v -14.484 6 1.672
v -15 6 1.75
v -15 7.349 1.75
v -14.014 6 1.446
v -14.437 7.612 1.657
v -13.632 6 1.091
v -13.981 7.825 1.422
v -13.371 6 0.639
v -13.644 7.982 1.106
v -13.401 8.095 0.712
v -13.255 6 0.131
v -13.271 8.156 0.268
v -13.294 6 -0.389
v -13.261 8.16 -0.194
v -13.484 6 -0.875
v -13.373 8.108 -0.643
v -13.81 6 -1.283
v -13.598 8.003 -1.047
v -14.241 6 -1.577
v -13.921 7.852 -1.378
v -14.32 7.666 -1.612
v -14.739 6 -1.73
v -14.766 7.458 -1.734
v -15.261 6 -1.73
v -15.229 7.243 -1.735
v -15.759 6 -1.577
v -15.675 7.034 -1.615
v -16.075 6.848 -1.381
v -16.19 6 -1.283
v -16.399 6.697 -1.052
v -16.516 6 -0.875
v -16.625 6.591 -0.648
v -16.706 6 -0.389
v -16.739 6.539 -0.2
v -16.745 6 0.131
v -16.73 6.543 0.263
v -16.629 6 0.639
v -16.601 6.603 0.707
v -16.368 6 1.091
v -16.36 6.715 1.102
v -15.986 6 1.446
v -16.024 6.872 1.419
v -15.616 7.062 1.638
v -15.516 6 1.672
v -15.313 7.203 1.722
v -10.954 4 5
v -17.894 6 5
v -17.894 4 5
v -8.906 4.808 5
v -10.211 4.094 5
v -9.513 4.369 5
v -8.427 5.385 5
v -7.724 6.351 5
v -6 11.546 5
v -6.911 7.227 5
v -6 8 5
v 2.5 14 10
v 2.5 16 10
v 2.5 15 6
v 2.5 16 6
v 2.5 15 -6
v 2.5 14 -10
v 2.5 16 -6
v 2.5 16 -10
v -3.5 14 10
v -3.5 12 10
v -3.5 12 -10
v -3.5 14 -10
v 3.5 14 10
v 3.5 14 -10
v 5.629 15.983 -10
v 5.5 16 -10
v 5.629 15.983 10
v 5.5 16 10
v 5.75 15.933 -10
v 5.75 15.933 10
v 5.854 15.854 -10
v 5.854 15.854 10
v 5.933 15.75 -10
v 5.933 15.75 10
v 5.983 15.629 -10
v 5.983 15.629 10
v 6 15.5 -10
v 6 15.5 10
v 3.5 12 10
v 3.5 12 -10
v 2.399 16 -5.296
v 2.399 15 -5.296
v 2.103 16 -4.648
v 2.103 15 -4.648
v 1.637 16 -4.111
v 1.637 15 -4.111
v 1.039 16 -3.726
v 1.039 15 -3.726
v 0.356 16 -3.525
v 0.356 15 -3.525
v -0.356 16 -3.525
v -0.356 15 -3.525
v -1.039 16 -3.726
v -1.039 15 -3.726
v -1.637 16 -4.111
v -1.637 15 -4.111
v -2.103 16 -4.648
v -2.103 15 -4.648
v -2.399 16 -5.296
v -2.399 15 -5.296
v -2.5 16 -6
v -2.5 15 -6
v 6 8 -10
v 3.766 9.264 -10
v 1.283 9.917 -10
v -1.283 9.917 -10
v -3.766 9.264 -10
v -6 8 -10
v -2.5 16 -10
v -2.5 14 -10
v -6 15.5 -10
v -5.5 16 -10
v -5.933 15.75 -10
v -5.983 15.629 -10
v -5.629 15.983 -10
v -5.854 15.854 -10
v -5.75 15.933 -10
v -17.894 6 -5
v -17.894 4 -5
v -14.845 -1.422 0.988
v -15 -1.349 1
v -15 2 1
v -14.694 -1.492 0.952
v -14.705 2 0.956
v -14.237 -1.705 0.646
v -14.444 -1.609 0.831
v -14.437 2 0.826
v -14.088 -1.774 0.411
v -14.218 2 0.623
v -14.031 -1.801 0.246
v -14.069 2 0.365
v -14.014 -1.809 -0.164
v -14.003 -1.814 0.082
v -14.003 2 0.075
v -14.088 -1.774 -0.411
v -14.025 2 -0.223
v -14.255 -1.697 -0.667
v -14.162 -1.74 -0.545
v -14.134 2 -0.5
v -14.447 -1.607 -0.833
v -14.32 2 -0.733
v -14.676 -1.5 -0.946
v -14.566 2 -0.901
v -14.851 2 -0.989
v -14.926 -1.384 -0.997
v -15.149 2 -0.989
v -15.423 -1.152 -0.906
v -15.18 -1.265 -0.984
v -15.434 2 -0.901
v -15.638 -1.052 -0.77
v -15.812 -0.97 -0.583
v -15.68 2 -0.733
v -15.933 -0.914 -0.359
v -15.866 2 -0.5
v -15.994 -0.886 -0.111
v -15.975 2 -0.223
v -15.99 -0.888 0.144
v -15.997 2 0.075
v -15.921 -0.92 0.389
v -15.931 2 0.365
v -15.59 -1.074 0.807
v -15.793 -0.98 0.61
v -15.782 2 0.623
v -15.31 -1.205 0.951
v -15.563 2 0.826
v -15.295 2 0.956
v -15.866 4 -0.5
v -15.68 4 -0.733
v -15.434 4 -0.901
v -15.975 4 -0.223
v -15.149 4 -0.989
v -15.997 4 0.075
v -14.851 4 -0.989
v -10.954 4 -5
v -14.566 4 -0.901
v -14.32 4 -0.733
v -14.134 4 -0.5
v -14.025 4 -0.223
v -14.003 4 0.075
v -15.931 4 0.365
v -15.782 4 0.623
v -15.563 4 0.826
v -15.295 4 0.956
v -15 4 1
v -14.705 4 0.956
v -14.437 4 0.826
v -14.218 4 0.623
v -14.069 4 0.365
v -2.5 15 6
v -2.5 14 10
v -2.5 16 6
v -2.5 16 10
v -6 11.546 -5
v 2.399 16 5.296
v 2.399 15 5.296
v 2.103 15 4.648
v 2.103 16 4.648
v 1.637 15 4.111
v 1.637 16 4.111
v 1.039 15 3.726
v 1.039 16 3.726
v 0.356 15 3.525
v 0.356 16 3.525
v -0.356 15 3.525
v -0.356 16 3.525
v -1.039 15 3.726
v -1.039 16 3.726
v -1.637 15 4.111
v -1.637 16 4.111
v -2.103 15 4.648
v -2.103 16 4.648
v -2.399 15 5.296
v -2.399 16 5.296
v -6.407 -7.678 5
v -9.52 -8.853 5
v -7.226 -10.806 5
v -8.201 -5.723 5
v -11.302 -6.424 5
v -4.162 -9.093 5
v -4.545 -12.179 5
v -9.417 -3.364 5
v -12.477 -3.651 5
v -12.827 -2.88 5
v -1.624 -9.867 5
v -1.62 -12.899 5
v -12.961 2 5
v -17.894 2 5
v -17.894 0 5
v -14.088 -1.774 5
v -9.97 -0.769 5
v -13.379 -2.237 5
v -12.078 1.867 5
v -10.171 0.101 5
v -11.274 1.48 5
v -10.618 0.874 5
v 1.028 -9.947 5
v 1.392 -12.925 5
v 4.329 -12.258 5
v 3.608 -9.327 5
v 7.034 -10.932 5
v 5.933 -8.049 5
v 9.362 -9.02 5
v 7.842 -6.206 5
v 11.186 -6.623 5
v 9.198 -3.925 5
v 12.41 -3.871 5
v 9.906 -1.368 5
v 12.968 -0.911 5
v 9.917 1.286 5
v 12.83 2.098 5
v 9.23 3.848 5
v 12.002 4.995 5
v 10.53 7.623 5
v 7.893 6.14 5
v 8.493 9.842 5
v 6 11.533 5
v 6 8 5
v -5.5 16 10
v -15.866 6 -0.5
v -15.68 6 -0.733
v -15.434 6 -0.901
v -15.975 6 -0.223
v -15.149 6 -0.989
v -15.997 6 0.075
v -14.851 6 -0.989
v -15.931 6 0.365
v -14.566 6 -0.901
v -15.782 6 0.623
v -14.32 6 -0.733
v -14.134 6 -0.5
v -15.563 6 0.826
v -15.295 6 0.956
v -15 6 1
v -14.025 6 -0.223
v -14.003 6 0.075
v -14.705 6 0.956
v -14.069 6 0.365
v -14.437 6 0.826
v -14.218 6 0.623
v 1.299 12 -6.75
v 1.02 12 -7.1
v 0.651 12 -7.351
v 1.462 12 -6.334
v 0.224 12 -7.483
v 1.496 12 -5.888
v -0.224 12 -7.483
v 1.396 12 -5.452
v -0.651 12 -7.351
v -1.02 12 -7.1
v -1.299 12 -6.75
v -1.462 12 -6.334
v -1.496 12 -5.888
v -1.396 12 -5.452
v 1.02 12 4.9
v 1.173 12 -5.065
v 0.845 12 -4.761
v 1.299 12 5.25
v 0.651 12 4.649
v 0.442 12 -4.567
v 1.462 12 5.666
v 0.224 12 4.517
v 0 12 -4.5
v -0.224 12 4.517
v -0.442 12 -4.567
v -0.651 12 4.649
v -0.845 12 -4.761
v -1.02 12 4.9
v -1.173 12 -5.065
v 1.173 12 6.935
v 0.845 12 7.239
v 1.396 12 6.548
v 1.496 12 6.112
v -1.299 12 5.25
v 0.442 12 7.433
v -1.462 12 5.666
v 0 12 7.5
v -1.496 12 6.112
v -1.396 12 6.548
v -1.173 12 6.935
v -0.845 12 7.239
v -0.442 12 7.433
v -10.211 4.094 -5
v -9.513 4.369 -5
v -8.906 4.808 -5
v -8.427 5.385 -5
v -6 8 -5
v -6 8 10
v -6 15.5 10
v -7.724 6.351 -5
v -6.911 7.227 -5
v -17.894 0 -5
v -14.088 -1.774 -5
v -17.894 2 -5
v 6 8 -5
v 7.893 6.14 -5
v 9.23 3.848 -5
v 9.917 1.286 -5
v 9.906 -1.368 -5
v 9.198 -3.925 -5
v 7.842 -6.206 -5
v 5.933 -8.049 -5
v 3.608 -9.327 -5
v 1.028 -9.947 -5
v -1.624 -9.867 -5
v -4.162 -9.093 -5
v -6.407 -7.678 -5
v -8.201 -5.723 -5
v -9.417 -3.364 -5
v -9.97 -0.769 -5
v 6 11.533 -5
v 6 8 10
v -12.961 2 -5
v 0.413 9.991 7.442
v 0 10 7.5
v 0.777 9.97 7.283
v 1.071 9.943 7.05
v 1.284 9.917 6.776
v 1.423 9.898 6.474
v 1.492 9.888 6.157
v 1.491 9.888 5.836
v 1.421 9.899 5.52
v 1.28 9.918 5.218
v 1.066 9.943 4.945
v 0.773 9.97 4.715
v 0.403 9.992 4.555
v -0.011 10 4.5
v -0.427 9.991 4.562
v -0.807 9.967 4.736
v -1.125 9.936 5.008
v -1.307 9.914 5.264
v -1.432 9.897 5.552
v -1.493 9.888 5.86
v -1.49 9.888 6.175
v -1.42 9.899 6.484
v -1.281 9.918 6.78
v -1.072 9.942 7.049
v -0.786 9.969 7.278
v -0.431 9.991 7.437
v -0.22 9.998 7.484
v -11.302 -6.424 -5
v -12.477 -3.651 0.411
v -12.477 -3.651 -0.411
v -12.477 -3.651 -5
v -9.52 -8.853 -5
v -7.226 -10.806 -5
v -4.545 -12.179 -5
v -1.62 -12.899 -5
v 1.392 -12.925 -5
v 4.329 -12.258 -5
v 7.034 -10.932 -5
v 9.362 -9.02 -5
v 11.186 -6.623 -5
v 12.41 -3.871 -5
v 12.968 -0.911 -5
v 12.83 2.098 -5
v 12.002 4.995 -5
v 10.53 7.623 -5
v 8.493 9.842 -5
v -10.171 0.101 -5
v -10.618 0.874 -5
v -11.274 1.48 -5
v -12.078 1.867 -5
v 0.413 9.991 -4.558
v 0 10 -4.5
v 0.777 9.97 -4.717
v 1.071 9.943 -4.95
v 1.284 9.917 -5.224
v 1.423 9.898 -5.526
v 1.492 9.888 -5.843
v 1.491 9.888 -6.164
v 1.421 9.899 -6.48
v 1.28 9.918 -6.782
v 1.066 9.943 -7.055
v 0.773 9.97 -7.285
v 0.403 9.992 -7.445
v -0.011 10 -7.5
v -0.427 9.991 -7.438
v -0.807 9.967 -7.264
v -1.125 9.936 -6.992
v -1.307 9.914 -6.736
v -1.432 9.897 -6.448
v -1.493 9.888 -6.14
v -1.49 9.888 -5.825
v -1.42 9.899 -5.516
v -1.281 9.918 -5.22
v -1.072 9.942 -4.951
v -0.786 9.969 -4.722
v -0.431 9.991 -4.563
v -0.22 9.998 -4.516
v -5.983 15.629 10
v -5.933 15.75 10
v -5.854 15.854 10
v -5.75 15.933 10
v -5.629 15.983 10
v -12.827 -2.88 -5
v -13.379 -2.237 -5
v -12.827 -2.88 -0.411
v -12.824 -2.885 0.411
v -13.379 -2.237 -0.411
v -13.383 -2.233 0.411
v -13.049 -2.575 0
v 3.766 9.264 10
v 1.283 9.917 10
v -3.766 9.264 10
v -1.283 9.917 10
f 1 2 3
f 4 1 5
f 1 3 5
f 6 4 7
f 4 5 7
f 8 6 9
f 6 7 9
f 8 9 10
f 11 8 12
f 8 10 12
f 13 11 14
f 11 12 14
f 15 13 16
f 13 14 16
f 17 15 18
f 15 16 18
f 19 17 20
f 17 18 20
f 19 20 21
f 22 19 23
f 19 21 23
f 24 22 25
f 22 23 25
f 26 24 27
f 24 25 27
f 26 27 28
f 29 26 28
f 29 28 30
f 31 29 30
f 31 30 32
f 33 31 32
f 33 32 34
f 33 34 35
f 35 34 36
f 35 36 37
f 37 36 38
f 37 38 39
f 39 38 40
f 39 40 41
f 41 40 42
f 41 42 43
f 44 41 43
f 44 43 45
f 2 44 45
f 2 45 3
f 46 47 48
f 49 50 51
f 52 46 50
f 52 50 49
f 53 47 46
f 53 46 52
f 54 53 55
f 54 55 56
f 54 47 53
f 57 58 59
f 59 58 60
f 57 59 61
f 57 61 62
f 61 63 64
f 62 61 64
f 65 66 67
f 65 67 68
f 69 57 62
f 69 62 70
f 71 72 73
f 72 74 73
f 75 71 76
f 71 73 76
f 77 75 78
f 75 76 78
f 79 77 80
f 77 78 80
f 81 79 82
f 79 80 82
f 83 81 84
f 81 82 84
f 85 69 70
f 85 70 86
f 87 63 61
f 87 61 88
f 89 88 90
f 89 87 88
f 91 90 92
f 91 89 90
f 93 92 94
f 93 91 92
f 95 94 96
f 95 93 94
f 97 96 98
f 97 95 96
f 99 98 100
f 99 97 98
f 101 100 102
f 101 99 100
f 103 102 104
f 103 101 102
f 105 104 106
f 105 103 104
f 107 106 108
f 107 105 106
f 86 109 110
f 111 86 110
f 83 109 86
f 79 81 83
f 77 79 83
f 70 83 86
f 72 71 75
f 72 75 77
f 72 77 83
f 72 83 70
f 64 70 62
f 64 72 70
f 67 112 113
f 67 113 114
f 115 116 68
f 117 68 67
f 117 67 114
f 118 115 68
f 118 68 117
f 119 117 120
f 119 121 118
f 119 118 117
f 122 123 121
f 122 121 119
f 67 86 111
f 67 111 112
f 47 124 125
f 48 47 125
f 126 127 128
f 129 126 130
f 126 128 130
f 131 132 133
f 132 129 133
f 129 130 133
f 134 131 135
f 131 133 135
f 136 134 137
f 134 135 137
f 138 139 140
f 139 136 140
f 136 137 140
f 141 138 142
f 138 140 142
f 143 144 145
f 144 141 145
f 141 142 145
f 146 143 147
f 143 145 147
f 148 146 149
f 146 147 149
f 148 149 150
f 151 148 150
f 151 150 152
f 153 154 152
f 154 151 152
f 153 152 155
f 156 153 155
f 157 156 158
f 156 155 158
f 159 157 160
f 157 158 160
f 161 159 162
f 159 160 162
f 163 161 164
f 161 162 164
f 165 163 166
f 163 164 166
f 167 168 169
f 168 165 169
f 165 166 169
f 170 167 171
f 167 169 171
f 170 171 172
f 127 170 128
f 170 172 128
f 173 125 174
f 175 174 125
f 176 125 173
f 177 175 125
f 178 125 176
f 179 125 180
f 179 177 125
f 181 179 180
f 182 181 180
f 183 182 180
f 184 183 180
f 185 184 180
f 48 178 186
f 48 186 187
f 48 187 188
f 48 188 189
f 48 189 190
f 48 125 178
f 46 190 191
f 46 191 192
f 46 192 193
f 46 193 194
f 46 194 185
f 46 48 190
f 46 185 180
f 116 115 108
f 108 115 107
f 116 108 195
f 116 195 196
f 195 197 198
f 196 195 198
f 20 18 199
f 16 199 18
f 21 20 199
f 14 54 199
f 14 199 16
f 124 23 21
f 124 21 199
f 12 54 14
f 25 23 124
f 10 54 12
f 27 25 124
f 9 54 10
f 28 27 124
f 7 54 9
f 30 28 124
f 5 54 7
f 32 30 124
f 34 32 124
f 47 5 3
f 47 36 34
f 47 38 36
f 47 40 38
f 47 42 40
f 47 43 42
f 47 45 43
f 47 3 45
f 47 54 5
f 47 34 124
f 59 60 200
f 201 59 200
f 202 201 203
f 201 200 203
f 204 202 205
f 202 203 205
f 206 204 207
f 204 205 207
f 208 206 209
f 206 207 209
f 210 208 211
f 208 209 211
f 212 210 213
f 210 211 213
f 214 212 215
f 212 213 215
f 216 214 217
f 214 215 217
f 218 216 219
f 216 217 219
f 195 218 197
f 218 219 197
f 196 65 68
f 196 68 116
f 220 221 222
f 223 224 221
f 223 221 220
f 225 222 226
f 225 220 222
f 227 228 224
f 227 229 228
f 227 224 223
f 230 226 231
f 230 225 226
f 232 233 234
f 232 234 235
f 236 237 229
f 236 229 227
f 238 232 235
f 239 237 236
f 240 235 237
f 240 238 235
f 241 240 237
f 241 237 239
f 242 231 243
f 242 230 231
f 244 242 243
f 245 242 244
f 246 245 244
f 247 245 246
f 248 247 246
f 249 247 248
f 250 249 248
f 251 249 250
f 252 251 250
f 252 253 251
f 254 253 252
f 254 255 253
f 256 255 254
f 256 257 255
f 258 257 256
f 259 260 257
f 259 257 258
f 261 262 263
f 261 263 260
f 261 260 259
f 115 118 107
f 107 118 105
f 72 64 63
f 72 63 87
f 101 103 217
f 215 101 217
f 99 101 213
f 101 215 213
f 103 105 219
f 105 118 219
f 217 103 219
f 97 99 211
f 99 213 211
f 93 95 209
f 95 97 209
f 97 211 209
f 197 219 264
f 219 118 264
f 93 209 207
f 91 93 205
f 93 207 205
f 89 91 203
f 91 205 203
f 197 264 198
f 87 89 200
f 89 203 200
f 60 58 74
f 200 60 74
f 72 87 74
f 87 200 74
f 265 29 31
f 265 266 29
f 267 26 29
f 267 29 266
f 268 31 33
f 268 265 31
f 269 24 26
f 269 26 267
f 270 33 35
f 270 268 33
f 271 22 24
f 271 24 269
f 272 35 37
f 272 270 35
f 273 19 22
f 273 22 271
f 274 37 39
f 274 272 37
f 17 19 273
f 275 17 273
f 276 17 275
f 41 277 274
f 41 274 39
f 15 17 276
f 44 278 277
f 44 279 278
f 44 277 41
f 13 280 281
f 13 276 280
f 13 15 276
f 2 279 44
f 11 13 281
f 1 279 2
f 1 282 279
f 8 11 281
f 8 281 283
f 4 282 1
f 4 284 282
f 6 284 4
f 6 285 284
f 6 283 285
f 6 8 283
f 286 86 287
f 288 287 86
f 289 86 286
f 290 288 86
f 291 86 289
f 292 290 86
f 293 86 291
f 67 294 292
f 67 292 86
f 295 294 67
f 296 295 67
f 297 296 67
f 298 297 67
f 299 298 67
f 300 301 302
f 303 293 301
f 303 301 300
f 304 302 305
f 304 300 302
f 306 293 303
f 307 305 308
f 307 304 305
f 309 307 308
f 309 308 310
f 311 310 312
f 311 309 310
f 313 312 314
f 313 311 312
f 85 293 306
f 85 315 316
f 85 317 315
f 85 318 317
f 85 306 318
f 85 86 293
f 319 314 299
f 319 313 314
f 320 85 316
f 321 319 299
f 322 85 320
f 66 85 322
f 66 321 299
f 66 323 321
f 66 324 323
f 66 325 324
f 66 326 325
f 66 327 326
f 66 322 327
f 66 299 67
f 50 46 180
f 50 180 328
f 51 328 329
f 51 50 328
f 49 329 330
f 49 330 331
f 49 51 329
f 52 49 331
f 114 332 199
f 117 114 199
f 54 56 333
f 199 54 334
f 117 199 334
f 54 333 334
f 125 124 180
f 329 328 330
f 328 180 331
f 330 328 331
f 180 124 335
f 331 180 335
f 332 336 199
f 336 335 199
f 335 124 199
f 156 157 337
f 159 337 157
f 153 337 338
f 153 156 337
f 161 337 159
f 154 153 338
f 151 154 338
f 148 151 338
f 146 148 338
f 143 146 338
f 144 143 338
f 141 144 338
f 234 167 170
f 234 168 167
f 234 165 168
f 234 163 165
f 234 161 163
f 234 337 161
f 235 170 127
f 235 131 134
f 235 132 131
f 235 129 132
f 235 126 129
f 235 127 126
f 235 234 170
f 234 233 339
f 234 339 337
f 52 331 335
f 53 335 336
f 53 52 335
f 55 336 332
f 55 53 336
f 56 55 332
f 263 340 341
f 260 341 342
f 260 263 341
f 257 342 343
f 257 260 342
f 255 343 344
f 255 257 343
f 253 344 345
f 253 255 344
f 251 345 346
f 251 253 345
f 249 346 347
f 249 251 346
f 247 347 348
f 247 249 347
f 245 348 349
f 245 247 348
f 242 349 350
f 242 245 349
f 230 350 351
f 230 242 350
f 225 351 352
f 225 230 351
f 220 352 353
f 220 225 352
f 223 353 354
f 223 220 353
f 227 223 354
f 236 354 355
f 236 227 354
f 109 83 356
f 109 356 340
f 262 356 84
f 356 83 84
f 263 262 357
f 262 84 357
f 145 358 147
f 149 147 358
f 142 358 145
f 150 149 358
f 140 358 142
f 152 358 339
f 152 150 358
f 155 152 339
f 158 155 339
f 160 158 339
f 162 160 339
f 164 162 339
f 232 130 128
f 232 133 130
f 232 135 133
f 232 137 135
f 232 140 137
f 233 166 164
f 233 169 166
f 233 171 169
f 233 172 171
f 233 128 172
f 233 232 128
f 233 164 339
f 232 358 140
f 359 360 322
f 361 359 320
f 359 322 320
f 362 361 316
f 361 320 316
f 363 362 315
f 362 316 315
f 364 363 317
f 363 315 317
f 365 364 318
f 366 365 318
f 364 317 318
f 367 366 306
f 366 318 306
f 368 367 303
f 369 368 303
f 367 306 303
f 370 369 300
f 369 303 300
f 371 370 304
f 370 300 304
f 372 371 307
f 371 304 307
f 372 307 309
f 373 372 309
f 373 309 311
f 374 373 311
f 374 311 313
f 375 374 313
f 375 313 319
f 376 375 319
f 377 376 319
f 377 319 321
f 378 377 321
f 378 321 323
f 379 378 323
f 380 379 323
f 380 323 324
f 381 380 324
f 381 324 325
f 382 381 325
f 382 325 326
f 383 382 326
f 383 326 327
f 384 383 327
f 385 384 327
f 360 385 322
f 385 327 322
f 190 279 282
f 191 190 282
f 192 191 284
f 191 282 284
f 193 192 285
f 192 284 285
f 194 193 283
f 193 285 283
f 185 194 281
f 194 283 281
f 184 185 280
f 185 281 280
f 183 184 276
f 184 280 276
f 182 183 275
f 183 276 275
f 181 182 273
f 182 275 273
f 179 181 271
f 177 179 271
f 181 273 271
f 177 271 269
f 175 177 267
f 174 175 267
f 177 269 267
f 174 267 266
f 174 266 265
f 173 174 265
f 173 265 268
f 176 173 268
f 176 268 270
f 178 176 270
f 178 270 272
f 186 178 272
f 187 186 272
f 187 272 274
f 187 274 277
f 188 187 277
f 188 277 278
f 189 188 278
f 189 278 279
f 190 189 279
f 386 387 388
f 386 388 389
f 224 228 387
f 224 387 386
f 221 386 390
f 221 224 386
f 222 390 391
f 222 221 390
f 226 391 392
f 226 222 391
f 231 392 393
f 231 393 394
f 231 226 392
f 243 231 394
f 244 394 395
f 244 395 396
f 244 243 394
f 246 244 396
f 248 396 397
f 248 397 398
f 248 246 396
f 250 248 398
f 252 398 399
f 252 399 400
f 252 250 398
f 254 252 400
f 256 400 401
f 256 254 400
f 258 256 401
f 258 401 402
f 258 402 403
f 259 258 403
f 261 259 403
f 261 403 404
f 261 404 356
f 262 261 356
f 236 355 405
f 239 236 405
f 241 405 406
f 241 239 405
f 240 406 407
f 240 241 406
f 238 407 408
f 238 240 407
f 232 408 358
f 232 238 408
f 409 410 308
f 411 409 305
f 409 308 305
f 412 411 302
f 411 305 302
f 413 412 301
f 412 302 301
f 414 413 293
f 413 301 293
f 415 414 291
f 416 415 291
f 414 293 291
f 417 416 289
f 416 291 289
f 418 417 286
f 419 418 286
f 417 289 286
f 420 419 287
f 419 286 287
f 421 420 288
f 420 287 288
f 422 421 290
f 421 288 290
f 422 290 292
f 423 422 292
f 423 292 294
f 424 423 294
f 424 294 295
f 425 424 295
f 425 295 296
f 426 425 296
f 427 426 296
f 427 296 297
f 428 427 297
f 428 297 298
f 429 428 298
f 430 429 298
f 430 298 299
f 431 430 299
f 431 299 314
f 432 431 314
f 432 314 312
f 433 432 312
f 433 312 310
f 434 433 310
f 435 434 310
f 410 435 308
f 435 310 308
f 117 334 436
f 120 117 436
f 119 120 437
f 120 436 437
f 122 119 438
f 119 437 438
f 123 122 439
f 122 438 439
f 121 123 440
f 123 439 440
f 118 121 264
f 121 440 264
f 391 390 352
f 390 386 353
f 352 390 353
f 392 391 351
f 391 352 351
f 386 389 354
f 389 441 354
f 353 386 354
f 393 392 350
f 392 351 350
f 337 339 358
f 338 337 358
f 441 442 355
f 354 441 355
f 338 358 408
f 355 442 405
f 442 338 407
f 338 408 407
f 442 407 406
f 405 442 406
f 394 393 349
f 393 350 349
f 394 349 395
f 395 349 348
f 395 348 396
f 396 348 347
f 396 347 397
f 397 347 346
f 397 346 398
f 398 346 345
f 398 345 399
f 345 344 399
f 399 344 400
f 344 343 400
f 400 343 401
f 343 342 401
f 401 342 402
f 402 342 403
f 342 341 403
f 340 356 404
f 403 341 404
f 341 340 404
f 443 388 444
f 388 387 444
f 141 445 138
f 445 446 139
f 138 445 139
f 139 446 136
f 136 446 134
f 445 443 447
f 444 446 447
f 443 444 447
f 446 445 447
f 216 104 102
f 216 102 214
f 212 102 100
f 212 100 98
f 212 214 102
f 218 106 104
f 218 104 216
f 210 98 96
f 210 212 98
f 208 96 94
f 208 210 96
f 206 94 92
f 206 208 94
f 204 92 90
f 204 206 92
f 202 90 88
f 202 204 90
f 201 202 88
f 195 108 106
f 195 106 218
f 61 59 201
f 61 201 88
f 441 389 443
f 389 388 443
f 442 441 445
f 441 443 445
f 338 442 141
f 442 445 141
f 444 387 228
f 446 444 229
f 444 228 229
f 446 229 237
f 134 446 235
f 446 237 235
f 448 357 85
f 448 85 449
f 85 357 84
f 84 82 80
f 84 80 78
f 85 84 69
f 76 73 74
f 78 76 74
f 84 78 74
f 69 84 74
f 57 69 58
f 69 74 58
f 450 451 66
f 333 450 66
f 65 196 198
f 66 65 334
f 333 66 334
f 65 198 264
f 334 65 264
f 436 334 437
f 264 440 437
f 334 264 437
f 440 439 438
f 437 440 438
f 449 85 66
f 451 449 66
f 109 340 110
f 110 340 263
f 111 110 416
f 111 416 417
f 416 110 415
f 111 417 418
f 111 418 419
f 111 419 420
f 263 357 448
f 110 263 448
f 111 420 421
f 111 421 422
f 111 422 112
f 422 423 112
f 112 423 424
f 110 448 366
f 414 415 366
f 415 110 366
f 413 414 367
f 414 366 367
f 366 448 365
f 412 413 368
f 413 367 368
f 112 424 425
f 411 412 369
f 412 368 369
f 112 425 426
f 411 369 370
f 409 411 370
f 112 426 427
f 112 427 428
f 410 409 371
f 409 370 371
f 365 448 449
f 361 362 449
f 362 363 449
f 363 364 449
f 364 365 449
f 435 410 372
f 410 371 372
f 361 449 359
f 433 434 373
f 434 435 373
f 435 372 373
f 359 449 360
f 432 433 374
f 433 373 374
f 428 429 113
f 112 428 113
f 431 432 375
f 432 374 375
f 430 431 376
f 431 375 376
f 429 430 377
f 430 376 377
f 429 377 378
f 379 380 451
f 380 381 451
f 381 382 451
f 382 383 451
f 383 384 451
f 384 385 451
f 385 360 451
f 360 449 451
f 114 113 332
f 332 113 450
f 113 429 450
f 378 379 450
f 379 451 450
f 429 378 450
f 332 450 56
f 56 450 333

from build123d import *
from build123d.topology import SkipClean

# Parameters (mm, degrees)
BOSS_EXTRUDE1_DEPTH     = 5
CUT_EXTRUDE1_DEPTH      = 11
BOSS_EXTRUDE2_DEPTH     = 10
CUT_EXTRUDE2_DEPTH      = 21
CUT_EXTRUDE3_REACH      = 31
CUT_EXTRUDE4_REACH      = 27
CUT_EXTRUDE4_END_RADIUS = 10
SKETCH6_R               = 1.5
SKETCH9_R               = 1.75
CUT_EXTRUDE7_DEPTH      = 10
SKETCH10_R              = 1
CUT_EXTRUDE6_DEPTH      = 30
FILLET9_R               = 3


with BuildPart() as part:
    # Sketch1 → Boss-Extrude1 (new body, symmetric)
    with BuildSketch(Plane.XY):
        with BuildLine():
            Line((-17.893579058, 0), (-12.779389539, -2.384785738))
            ThreePointArc((-12.779389539, -2.384785738), (11.560882159, -5.945250516), (-5.494037403, 11.782001231))
            Line((-5.494037403, 11.782001231), (-17.893579058, 6))
            Line((-17.893579058, 6), (-17.893579058, 0))
        make_face()
    extrude(amount=BOSS_EXTRUDE1_DEPTH, both=True)

    # Sketch2 → Cut-Extrude1 (cut, through all)
    with BuildSketch(Plane.XY.offset(5)):
        with BuildLine():
            Line((-17.893579058, 4), (-10.95445115, 4))
            ThreePointArc((-10.95445115, 4), (-9.513297766, 4.368825942), (-8.426500885, 5.384615385))
            ThreePointArc((-8.426500885, 5.384615385), (9.699416117, -2.43337769), (-9.970370305, -0.769230769))
            ThreePointArc((-9.970370305, -0.769230769), (-10.923382735, 1.201398157), (-12.961481397, 2))
            Line((-12.961481397, 2), (-17.893579058, 2))
            Line((-17.893579058, 2), (-17.893579058, 4))
        make_face()
    extrude(amount=-CUT_EXTRUDE1_DEPTH, mode=Mode.SUBTRACT)

    # Sketch3 → Boss-Extrude2 (add, symmetric)
    with SkipClean():  # keep this step's faces unmerged: merging them makes the solid invalid here
        with BuildSketch(Plane.XY):
            with BuildLine():
                Line((-5.5, 16), (5.5, 16))
                ThreePointArc((5.5, 16), (5.853553391, 15.853553391), (6, 15.5))
                Line((6, 15.5), (6, 8))
                ThreePointArc((6, 8), (0, 10), (-6, 8))
                Line((-6, 8), (-6, 15.5))
                ThreePointArc((-6, 15.5), (-5.853553391, 15.853553391), (-5.5, 16))
            make_face()
        extrude(amount=BOSS_EXTRUDE2_DEPTH, both=True)

    # Sketch4 → Cut-Extrude2 (cut, through all)
    with SkipClean():  # keep this step's faces unmerged: merging them makes the solid invalid here
        with BuildSketch(Plane.XY.offset(10)):
            Polygon((-2.5, 15), (2.5, 15), (2.5, 14), (3.5, 14), (3.5, 12), (-3.5, 12), (-3.5, 14), (-2.5, 14), align=None)
        extrude(amount=-CUT_EXTRUDE2_DEPTH, mode=Mode.SUBTRACT)

    # Sketch5 → Cut-Extrude3 (cut, up to next)
    with BuildSketch(Plane(origin=(0, 16, 0), x_dir=(1, 0, 0), z_dir=(0, 1, 0)), mode=Mode.PRIVATE) as cut_extrude3_sk1:
        with BuildLine():
            Line((-2.5, 6), (-2.5, 10))
            Line((-2.5, 10), (2.5, 10))
            Line((2.5, 10), (2.5, 6))
            ThreePointArc((2.5, 6), (0, 3.5), (-2.5, 6))
        make_face()
    cut_extrude3_tool1 = extrude(cut_extrude3_sk1.sketch, amount=-CUT_EXTRUDE3_REACH, mode=Mode.PRIVATE) & part.part
    add(cut_extrude3_tool1.solids().sort_by_distance((0, 16, -6.992147))[0], mode=Mode.SUBTRACT)
    # Sketch5 → Cut-Extrude3 (cut, up to next)
    with BuildSketch(Plane(origin=(0, 16, 0), x_dir=(1, 0, 0), z_dir=(0, 1, 0)), mode=Mode.PRIVATE) as cut_extrude3_sk2:
        with BuildLine():
            Line((2.5, -10), (2.5, -6))
            ThreePointArc((2.5, -6), (0, -3.5), (-2.5, -6))
            Line((-2.5, -6), (-2.5, -10))
            Line((-2.5, -10), (2.5, -10))
        make_face()
    cut_extrude3_tool2 = extrude(cut_extrude3_sk2.sketch, amount=-CUT_EXTRUDE3_REACH, mode=Mode.PRIVATE) & part.part
    add(cut_extrude3_tool2.solids().sort_by_distance((0, 16, 6.992147))[0], mode=Mode.SUBTRACT)

    # Cut-Extrude4: up to this cylinder (the profile starts outside it)
    cut_extrude4_end = Plane(origin=(0, 0, 0), z_dir=(0, 0, 1)) * Cylinder(CUT_EXTRUDE4_END_RADIUS, 87, mode=Mode.PRIVATE)
    # Sketch6 → Cut-Extrude4 (cut, up to the surface)
    with BuildSketch(Plane(origin=(0, 12, 0), x_dir=(1, 0, 0), z_dir=(0, 1, 0)), mode=Mode.PRIVATE) as cut_extrude4_sk1:
        with Locations(Location((0, 6, 0), (0, 0, 270))):  # turned: the seam where the file's is
            Circle(SKETCH6_R)
    cut_extrude4_tool1 = extrude(cut_extrude4_sk1.sketch, amount=-CUT_EXTRUDE4_REACH, mode=Mode.PRIVATE) - cut_extrude4_end
    add(cut_extrude4_tool1.solids().sort_by_distance((0, 12, -6))[0], mode=Mode.SUBTRACT)
    # Sketch6 → Cut-Extrude4 (cut, up to the surface)
    with BuildSketch(Plane(origin=(0, 12, 0), x_dir=(1, 0, 0), z_dir=(0, 1, 0)), mode=Mode.PRIVATE) as cut_extrude4_sk2:
        with Locations(Location((0, -6, 0), (0, 0, 270))):  # turned: the seam where the file's is
            Circle(SKETCH6_R)
    cut_extrude4_tool2 = extrude(cut_extrude4_sk2.sketch, amount=-CUT_EXTRUDE4_REACH, mode=Mode.PRIVATE) - cut_extrude4_end
    add(cut_extrude4_tool2.solids().sort_by_distance((0, 12, 6))[0], mode=Mode.SUBTRACT)

    # Sketch9 → Cut-Extrude7 (cut)
    with BuildSketch(Plane(origin=(0, 16, 0), x_dir=(1, 0, 0), z_dir=(0, 1, 0))):
        with Locations(Location((-15, 0, 0), (0, 0, 270))):  # turned: the seam where the file's is
            Circle(SKETCH9_R)
    extrude(amount=-CUT_EXTRUDE7_DEPTH, mode=Mode.SUBTRACT)

    # Sketch10 → Cut-Extrude6 (cut, through all)
    with BuildSketch(Plane(origin=(0, 16, 0), x_dir=(1, 0, 0), z_dir=(0, 1, 0))):
        with Locations(Location((-15, 0, 0), (0, 0, 270))):  # turned: the seam where the file's is
            Circle(SKETCH10_R)
    extrude(amount=-CUT_EXTRUDE6_DEPTH, mode=Mode.SUBTRACT)

    # Fillet9
    fillet9_edges = [part.edges().sort_by_distance(p)[0] for p in [
        (-12.779389539, -2.384785738, 0),
    ]]
    fillet(fillet9_edges, radius=FILLET9_R)


solid = part.part
